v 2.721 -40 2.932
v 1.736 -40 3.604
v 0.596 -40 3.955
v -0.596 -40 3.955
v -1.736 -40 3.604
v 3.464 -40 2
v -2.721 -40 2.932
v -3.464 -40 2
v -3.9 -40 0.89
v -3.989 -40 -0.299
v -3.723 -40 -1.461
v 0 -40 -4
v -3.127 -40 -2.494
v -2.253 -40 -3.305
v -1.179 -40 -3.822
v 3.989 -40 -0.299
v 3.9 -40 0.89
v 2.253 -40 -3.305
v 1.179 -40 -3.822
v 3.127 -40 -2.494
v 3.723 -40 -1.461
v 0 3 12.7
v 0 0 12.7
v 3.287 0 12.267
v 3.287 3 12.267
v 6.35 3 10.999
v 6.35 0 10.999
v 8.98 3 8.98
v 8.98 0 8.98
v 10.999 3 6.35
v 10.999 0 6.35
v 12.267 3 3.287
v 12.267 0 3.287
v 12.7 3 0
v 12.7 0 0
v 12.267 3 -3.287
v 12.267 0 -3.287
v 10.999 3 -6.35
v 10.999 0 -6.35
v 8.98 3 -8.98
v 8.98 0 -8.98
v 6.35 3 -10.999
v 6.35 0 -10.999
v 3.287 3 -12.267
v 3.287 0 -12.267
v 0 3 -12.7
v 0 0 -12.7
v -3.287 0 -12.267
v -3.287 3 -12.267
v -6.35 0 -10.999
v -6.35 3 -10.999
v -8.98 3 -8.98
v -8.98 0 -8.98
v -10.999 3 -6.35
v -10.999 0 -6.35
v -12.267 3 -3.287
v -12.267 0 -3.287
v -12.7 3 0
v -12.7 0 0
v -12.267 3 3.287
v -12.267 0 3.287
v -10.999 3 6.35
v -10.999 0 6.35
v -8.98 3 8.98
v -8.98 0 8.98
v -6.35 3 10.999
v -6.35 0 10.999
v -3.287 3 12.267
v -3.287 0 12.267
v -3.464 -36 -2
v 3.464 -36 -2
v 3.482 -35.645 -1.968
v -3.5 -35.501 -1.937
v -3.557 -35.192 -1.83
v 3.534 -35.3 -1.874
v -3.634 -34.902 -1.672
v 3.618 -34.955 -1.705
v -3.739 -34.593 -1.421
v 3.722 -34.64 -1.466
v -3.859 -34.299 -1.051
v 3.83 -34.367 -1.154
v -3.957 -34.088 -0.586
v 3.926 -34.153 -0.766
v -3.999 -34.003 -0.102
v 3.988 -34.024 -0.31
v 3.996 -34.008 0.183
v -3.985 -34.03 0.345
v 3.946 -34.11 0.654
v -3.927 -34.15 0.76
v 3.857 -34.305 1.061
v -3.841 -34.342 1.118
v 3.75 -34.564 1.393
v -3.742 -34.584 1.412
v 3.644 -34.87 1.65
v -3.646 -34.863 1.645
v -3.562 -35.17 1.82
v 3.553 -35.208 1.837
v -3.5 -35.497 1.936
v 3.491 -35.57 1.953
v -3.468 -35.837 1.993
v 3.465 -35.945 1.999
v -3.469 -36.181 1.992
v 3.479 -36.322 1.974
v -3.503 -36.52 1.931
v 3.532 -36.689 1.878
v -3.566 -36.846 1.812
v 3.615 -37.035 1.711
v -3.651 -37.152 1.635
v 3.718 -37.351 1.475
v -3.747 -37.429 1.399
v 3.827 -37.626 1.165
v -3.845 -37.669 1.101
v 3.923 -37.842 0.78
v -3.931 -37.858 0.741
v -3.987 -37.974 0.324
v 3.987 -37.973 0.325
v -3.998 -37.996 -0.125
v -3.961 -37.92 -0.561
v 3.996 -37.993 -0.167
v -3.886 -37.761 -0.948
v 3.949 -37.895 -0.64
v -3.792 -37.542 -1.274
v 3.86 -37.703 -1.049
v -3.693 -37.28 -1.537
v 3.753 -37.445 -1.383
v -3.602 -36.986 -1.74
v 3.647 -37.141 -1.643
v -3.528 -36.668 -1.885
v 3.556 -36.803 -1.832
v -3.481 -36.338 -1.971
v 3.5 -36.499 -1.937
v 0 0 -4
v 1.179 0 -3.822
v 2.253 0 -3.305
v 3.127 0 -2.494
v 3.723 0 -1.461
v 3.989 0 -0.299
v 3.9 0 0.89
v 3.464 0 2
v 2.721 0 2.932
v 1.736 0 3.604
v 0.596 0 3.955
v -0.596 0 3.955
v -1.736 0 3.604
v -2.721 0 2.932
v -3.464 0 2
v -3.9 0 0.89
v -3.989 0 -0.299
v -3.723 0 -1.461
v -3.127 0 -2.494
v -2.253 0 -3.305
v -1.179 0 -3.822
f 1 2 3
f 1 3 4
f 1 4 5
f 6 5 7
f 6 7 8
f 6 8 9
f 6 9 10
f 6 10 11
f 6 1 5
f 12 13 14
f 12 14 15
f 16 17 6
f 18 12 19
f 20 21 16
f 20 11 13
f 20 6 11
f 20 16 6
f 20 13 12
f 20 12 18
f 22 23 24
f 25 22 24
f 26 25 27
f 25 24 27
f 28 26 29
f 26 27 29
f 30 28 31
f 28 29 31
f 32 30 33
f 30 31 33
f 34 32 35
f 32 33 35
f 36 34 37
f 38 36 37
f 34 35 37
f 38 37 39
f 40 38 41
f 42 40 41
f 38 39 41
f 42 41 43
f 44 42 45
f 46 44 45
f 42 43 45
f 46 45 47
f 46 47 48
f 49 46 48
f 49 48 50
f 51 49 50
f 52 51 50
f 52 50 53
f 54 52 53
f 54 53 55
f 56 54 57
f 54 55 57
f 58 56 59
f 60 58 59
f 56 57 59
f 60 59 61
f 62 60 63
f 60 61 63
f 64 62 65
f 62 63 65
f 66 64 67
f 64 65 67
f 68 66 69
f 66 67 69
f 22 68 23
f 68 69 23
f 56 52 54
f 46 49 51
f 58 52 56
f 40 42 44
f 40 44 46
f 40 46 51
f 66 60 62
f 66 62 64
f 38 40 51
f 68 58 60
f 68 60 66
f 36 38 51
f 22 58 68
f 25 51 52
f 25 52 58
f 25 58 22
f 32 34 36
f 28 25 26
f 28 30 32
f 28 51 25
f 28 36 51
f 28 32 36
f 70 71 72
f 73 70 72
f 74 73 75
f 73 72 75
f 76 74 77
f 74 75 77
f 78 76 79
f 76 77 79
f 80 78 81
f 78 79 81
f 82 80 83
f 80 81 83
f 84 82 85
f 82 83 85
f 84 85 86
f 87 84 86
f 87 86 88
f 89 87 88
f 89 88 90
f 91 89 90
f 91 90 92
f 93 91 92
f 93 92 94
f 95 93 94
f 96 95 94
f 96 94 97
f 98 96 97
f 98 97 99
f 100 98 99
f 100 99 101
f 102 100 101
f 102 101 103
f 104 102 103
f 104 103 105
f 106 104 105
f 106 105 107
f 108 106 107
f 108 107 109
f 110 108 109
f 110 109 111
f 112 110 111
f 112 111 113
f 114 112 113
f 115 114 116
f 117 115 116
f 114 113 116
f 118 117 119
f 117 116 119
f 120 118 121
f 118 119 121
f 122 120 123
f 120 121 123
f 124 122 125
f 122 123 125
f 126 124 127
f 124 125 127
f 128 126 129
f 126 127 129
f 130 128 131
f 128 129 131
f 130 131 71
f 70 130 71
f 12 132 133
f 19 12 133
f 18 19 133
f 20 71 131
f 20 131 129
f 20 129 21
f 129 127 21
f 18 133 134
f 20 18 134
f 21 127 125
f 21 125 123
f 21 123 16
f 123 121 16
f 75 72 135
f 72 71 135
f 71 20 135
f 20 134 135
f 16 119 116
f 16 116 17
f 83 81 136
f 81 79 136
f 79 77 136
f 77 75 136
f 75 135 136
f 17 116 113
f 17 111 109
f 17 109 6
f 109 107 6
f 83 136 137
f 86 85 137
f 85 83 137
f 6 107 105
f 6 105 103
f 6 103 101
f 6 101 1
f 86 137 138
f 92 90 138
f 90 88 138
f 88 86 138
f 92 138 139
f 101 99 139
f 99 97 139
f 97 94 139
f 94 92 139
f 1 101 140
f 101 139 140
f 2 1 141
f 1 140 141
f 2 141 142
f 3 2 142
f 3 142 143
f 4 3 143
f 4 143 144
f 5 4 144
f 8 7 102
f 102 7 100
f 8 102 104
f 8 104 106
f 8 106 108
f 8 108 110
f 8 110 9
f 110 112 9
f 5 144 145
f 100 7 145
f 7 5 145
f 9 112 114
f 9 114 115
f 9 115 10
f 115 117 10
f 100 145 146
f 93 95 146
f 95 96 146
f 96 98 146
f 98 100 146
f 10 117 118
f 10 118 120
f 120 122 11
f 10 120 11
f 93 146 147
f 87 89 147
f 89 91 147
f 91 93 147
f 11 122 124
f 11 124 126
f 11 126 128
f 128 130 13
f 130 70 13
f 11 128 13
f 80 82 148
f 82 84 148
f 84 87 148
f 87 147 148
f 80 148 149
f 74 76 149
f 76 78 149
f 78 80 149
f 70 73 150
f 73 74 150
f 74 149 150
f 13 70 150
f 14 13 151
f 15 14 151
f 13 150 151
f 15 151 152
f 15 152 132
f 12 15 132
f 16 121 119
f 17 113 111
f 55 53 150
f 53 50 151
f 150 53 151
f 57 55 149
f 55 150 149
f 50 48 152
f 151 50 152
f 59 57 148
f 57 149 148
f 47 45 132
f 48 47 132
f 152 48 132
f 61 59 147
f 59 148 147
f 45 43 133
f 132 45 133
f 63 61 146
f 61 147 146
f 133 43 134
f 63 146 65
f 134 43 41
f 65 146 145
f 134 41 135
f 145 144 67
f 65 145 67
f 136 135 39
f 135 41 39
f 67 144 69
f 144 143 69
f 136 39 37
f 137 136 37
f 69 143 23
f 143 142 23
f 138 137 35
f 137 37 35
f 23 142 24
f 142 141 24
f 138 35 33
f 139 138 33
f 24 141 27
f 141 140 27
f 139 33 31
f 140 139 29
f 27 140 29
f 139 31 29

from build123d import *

# Parameters (mm, degrees)
CROQUIS1_R              = 12.7
SALIENTE_EXTRUIR1_DEPTH = 3
CROQUIS2_R              = 4
SALIENTE_EXTRUIR2_DEPTH = 40
CROQUIS4_R              = 2
CORTAR_EXTRUIR1_DEPTH   = 10


with BuildPart() as part:
    # Croquis1 → Saliente-Extruir1 (new body)
    with BuildSketch(Plane(origin=(0, 0, 0), x_dir=(1, 0, 0), z_dir=(0, 1, 0))):
        with Locations(Location((0, 0, 0), (0, 0, 270))):
            Circle(CROQUIS1_R)
    extrude(amount=SALIENTE_EXTRUIR1_DEPTH)

    # Croquis2 → Saliente-Extruir2 (add)
    with BuildSketch(Plane.XZ):
        with Locations(Location((0, 0, 0), (0, 0, 270))):
            Circle(CROQUIS2_R)
    extrude(amount=SALIENTE_EXTRUIR2_DEPTH)

    # Croquis4 → Cortar-Extruir1 (cut)
    with BuildSketch(Plane(origin=(4, 0, 0), x_dir=(0, 0, -1), z_dir=(1, 0, 0))):
        with Locations((0, -36)):
            Circle(CROQUIS4_R)
    extrude(amount=-CORTAR_EXTRUIR1_DEPTH, mode=Mode.SUBTRACT)


solid = part.part
